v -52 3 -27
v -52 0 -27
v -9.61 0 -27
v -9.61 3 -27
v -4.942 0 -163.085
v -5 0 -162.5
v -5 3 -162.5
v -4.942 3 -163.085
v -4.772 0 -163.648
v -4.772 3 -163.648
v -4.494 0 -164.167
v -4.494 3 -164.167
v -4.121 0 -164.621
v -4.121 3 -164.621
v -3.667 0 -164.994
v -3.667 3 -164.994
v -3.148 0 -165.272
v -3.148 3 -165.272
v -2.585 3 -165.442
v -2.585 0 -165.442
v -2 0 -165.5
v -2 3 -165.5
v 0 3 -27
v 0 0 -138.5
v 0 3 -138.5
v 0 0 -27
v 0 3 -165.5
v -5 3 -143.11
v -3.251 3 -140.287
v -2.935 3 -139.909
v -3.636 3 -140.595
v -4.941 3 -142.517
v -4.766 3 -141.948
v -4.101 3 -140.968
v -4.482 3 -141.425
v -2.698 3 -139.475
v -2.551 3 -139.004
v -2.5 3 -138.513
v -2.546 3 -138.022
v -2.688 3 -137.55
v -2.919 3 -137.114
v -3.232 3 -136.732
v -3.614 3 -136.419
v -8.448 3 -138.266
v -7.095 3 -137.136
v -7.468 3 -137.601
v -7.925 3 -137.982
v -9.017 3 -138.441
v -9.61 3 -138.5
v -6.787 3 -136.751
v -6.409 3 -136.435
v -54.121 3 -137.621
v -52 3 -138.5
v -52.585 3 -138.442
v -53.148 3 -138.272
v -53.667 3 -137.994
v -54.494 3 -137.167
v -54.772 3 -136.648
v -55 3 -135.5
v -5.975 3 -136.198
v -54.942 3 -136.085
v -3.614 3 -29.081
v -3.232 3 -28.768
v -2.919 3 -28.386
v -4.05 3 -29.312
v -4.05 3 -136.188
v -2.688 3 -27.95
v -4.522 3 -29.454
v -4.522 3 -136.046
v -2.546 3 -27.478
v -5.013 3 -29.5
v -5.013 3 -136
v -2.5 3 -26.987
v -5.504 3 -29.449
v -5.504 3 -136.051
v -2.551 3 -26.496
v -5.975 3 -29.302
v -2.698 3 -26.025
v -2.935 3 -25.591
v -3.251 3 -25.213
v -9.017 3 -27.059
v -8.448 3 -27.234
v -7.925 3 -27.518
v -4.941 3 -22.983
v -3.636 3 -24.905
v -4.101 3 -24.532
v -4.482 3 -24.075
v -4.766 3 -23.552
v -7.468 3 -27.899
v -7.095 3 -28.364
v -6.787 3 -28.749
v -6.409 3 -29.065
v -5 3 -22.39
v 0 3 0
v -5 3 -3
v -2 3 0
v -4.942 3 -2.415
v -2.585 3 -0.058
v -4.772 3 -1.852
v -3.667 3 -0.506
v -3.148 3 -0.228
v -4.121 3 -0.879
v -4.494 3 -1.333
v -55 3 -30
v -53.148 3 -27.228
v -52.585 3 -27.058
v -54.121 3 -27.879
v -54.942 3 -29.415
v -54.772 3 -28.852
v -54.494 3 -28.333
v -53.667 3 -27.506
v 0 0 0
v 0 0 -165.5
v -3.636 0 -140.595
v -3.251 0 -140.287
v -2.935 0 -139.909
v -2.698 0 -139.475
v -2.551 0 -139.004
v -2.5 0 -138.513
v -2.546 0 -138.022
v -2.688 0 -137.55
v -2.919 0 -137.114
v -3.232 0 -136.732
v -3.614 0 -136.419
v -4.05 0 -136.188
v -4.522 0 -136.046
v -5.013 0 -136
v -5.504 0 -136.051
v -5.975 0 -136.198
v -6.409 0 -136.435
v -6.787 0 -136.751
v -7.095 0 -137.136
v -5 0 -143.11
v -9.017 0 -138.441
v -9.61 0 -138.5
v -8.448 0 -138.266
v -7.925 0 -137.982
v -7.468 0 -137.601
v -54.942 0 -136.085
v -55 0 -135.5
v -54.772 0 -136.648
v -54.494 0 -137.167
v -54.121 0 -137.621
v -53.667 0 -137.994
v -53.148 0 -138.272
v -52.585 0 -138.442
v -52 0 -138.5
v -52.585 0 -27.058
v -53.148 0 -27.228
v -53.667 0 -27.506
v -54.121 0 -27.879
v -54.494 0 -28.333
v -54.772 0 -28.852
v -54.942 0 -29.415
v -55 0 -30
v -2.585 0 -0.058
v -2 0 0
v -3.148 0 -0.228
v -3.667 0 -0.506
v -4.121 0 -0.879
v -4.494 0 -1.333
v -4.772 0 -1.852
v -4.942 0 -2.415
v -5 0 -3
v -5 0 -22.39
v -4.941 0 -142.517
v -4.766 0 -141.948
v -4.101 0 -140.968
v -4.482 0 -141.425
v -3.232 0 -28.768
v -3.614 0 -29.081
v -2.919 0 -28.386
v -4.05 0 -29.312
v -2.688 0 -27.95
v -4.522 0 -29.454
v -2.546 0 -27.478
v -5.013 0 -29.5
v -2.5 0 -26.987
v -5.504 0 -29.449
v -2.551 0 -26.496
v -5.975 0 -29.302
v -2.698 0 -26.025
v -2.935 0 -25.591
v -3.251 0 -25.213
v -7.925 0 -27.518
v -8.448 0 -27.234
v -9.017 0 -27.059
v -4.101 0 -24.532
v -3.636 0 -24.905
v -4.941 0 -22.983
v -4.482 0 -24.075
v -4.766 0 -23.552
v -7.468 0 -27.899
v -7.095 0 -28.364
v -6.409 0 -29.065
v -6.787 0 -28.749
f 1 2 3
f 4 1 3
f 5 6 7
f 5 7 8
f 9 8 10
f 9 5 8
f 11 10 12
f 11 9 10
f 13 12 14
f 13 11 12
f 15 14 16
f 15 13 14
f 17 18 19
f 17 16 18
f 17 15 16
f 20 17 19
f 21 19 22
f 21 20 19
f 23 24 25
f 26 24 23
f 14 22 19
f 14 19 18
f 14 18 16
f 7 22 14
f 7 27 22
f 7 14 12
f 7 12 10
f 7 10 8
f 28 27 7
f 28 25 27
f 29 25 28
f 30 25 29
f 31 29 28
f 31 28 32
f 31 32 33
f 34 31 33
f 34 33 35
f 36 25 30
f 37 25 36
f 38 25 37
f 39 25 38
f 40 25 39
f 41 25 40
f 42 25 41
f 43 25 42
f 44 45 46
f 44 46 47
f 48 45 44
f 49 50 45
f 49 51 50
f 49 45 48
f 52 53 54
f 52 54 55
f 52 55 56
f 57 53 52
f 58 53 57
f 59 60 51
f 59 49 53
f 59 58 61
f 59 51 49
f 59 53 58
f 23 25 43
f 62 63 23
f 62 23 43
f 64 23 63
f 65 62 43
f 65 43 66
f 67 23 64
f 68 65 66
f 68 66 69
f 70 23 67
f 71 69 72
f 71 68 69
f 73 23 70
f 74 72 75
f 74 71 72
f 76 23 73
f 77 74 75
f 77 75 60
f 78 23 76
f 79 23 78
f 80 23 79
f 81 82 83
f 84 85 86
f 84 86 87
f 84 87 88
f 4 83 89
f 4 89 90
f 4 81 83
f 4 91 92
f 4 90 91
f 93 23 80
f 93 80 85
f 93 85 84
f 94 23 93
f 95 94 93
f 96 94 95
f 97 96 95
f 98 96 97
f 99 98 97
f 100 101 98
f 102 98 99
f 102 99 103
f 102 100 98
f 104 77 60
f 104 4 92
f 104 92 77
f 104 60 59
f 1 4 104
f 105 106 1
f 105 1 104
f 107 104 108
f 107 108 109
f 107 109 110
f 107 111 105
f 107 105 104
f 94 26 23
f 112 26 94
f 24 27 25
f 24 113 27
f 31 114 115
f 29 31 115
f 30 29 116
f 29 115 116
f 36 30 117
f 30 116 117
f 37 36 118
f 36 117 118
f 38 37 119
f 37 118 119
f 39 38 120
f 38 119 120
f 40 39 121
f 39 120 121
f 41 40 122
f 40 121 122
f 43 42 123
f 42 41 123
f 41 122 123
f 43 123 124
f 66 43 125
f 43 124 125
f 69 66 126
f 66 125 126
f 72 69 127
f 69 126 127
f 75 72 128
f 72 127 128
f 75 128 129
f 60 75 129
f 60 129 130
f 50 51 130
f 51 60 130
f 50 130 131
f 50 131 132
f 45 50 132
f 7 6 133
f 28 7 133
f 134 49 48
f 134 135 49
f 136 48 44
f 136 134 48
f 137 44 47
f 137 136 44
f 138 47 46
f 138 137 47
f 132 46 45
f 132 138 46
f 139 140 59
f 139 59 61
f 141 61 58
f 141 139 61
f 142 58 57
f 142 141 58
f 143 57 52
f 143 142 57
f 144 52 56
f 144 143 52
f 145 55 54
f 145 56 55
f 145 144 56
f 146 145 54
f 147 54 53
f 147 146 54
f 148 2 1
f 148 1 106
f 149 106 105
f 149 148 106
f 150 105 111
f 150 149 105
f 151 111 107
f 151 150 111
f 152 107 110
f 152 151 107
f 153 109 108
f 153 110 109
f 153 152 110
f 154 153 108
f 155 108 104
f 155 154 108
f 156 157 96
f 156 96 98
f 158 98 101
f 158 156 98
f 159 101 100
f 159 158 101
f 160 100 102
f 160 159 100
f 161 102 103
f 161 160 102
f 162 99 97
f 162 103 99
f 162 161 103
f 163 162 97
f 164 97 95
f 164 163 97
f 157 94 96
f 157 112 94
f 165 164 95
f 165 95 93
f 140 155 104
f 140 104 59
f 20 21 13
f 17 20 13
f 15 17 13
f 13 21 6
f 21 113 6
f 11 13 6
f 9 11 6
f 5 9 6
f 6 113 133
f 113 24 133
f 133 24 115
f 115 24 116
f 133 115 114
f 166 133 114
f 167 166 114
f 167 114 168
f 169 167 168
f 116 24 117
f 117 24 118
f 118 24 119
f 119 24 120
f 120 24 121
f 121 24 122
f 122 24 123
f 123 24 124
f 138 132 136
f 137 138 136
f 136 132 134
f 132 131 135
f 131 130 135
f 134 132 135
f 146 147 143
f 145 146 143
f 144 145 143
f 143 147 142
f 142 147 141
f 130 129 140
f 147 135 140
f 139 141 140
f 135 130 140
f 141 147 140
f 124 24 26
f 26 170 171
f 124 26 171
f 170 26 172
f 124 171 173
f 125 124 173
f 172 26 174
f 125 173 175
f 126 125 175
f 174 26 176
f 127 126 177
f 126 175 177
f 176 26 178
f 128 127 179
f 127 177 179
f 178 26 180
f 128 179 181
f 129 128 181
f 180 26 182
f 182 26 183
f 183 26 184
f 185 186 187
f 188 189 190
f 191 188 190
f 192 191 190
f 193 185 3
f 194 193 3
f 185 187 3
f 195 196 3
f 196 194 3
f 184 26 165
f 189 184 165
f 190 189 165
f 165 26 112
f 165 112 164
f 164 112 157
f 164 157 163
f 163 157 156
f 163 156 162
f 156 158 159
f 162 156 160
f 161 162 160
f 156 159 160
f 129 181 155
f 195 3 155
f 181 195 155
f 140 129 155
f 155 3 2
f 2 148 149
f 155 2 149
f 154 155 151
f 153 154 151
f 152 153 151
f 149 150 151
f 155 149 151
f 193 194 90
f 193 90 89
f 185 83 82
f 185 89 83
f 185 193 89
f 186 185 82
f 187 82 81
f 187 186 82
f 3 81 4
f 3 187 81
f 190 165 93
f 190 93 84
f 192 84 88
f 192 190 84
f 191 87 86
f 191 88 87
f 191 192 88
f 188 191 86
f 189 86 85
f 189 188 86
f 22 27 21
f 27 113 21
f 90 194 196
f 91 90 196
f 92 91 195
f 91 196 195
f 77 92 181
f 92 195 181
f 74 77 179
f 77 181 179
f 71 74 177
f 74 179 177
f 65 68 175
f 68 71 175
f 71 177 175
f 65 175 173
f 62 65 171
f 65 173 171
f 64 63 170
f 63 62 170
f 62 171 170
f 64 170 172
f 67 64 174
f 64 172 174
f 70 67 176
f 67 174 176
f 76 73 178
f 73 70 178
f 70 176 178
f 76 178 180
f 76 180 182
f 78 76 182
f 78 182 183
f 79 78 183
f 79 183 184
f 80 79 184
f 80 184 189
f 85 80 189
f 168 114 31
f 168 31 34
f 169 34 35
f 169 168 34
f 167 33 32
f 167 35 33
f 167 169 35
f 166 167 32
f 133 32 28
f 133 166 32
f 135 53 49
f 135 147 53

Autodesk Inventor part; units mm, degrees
ref_plane "YZ Plane" through (0, 0, 0) normal (1, 0, 0) x (0, 1, 0)
ref_plane "XZ Plane" through (0, 0, 0) normal (0, 1, 0) x (-1, 0, 0)
ref_plane "XY Plane" through (0, 0, 0) normal (0, 0, 1) x (1, 0, 0)
sketch "Sketch1" plane through (0, 0, 0) normal (0, 1, 0) x (-1, 0, 0)
  line L0 (55, -30) -> (55, -135.5)
  line L1 (0, -165.5) -> (0, 0)
  line L2 (52, -27) -> (9.6098, -27)
  line L3 (0, -27) -> (0, 0)
  line L4 (52, -138.5) -> (9.6098, -138.5)
  line L5 (0, -138.5) -> (0, -165.5)
  line L6 (0, 0) -> (2, 0)
  line L7 (5, -3) -> (5, -22.3902)
  line L8 (0, -27) -> (0, 0)
  line L9 (0, -165.5) -> (2, -165.5)
  line L10 (5, -162.5) -> (5, -143.1098)
  line L11 (0, -138.5) -> (0, -165.5)
  arc A0 (3.6364, -24.9046) -> (7.0954, -28.3636) centre (5, -27) ccw
  arc A1 (7.0954, -137.1364) -> (3.6364, -140.5954) centre (5, -138.5) ccw
  arc A2 (55, -30) -> (52, -27) centre (52, -30) ccw
  arc A3 (52, -138.5) -> (55, -135.5) centre (52, -135.5) ccw
  arc A4 (9.6098, -27) -> (7.0954, -28.3636) centre (9.6098, -30) ccw
  arc A5 (3.6364, -24.9046) -> (5, -22.3902) centre (2, -22.3902) ccw
  arc A6 (7.0954, -137.1364) -> (9.6098, -138.5) centre (9.6098, -135.5) ccw
  arc A7 (5, -143.1098) -> (3.6364, -140.5954) centre (2, -143.1098) ccw
  arc A8 (5, -3) -> (2, 0) centre (2, -3) ccw
  arc A9 (2, -165.5) -> (5, -162.5) centre (2, -162.5) ccw
  point P0 (5, -24.5)
  point P1 (5, -141)
  point P2 (7.5, -27)
  point P3 (7.5, -138.5)
  dimension "d8" = 3
  dimension "d9" = 3
extrude "Extrusion1" add sketch "Sketch1" along normal blind 3
properties part number "Maze Wall Alignment Jig"
